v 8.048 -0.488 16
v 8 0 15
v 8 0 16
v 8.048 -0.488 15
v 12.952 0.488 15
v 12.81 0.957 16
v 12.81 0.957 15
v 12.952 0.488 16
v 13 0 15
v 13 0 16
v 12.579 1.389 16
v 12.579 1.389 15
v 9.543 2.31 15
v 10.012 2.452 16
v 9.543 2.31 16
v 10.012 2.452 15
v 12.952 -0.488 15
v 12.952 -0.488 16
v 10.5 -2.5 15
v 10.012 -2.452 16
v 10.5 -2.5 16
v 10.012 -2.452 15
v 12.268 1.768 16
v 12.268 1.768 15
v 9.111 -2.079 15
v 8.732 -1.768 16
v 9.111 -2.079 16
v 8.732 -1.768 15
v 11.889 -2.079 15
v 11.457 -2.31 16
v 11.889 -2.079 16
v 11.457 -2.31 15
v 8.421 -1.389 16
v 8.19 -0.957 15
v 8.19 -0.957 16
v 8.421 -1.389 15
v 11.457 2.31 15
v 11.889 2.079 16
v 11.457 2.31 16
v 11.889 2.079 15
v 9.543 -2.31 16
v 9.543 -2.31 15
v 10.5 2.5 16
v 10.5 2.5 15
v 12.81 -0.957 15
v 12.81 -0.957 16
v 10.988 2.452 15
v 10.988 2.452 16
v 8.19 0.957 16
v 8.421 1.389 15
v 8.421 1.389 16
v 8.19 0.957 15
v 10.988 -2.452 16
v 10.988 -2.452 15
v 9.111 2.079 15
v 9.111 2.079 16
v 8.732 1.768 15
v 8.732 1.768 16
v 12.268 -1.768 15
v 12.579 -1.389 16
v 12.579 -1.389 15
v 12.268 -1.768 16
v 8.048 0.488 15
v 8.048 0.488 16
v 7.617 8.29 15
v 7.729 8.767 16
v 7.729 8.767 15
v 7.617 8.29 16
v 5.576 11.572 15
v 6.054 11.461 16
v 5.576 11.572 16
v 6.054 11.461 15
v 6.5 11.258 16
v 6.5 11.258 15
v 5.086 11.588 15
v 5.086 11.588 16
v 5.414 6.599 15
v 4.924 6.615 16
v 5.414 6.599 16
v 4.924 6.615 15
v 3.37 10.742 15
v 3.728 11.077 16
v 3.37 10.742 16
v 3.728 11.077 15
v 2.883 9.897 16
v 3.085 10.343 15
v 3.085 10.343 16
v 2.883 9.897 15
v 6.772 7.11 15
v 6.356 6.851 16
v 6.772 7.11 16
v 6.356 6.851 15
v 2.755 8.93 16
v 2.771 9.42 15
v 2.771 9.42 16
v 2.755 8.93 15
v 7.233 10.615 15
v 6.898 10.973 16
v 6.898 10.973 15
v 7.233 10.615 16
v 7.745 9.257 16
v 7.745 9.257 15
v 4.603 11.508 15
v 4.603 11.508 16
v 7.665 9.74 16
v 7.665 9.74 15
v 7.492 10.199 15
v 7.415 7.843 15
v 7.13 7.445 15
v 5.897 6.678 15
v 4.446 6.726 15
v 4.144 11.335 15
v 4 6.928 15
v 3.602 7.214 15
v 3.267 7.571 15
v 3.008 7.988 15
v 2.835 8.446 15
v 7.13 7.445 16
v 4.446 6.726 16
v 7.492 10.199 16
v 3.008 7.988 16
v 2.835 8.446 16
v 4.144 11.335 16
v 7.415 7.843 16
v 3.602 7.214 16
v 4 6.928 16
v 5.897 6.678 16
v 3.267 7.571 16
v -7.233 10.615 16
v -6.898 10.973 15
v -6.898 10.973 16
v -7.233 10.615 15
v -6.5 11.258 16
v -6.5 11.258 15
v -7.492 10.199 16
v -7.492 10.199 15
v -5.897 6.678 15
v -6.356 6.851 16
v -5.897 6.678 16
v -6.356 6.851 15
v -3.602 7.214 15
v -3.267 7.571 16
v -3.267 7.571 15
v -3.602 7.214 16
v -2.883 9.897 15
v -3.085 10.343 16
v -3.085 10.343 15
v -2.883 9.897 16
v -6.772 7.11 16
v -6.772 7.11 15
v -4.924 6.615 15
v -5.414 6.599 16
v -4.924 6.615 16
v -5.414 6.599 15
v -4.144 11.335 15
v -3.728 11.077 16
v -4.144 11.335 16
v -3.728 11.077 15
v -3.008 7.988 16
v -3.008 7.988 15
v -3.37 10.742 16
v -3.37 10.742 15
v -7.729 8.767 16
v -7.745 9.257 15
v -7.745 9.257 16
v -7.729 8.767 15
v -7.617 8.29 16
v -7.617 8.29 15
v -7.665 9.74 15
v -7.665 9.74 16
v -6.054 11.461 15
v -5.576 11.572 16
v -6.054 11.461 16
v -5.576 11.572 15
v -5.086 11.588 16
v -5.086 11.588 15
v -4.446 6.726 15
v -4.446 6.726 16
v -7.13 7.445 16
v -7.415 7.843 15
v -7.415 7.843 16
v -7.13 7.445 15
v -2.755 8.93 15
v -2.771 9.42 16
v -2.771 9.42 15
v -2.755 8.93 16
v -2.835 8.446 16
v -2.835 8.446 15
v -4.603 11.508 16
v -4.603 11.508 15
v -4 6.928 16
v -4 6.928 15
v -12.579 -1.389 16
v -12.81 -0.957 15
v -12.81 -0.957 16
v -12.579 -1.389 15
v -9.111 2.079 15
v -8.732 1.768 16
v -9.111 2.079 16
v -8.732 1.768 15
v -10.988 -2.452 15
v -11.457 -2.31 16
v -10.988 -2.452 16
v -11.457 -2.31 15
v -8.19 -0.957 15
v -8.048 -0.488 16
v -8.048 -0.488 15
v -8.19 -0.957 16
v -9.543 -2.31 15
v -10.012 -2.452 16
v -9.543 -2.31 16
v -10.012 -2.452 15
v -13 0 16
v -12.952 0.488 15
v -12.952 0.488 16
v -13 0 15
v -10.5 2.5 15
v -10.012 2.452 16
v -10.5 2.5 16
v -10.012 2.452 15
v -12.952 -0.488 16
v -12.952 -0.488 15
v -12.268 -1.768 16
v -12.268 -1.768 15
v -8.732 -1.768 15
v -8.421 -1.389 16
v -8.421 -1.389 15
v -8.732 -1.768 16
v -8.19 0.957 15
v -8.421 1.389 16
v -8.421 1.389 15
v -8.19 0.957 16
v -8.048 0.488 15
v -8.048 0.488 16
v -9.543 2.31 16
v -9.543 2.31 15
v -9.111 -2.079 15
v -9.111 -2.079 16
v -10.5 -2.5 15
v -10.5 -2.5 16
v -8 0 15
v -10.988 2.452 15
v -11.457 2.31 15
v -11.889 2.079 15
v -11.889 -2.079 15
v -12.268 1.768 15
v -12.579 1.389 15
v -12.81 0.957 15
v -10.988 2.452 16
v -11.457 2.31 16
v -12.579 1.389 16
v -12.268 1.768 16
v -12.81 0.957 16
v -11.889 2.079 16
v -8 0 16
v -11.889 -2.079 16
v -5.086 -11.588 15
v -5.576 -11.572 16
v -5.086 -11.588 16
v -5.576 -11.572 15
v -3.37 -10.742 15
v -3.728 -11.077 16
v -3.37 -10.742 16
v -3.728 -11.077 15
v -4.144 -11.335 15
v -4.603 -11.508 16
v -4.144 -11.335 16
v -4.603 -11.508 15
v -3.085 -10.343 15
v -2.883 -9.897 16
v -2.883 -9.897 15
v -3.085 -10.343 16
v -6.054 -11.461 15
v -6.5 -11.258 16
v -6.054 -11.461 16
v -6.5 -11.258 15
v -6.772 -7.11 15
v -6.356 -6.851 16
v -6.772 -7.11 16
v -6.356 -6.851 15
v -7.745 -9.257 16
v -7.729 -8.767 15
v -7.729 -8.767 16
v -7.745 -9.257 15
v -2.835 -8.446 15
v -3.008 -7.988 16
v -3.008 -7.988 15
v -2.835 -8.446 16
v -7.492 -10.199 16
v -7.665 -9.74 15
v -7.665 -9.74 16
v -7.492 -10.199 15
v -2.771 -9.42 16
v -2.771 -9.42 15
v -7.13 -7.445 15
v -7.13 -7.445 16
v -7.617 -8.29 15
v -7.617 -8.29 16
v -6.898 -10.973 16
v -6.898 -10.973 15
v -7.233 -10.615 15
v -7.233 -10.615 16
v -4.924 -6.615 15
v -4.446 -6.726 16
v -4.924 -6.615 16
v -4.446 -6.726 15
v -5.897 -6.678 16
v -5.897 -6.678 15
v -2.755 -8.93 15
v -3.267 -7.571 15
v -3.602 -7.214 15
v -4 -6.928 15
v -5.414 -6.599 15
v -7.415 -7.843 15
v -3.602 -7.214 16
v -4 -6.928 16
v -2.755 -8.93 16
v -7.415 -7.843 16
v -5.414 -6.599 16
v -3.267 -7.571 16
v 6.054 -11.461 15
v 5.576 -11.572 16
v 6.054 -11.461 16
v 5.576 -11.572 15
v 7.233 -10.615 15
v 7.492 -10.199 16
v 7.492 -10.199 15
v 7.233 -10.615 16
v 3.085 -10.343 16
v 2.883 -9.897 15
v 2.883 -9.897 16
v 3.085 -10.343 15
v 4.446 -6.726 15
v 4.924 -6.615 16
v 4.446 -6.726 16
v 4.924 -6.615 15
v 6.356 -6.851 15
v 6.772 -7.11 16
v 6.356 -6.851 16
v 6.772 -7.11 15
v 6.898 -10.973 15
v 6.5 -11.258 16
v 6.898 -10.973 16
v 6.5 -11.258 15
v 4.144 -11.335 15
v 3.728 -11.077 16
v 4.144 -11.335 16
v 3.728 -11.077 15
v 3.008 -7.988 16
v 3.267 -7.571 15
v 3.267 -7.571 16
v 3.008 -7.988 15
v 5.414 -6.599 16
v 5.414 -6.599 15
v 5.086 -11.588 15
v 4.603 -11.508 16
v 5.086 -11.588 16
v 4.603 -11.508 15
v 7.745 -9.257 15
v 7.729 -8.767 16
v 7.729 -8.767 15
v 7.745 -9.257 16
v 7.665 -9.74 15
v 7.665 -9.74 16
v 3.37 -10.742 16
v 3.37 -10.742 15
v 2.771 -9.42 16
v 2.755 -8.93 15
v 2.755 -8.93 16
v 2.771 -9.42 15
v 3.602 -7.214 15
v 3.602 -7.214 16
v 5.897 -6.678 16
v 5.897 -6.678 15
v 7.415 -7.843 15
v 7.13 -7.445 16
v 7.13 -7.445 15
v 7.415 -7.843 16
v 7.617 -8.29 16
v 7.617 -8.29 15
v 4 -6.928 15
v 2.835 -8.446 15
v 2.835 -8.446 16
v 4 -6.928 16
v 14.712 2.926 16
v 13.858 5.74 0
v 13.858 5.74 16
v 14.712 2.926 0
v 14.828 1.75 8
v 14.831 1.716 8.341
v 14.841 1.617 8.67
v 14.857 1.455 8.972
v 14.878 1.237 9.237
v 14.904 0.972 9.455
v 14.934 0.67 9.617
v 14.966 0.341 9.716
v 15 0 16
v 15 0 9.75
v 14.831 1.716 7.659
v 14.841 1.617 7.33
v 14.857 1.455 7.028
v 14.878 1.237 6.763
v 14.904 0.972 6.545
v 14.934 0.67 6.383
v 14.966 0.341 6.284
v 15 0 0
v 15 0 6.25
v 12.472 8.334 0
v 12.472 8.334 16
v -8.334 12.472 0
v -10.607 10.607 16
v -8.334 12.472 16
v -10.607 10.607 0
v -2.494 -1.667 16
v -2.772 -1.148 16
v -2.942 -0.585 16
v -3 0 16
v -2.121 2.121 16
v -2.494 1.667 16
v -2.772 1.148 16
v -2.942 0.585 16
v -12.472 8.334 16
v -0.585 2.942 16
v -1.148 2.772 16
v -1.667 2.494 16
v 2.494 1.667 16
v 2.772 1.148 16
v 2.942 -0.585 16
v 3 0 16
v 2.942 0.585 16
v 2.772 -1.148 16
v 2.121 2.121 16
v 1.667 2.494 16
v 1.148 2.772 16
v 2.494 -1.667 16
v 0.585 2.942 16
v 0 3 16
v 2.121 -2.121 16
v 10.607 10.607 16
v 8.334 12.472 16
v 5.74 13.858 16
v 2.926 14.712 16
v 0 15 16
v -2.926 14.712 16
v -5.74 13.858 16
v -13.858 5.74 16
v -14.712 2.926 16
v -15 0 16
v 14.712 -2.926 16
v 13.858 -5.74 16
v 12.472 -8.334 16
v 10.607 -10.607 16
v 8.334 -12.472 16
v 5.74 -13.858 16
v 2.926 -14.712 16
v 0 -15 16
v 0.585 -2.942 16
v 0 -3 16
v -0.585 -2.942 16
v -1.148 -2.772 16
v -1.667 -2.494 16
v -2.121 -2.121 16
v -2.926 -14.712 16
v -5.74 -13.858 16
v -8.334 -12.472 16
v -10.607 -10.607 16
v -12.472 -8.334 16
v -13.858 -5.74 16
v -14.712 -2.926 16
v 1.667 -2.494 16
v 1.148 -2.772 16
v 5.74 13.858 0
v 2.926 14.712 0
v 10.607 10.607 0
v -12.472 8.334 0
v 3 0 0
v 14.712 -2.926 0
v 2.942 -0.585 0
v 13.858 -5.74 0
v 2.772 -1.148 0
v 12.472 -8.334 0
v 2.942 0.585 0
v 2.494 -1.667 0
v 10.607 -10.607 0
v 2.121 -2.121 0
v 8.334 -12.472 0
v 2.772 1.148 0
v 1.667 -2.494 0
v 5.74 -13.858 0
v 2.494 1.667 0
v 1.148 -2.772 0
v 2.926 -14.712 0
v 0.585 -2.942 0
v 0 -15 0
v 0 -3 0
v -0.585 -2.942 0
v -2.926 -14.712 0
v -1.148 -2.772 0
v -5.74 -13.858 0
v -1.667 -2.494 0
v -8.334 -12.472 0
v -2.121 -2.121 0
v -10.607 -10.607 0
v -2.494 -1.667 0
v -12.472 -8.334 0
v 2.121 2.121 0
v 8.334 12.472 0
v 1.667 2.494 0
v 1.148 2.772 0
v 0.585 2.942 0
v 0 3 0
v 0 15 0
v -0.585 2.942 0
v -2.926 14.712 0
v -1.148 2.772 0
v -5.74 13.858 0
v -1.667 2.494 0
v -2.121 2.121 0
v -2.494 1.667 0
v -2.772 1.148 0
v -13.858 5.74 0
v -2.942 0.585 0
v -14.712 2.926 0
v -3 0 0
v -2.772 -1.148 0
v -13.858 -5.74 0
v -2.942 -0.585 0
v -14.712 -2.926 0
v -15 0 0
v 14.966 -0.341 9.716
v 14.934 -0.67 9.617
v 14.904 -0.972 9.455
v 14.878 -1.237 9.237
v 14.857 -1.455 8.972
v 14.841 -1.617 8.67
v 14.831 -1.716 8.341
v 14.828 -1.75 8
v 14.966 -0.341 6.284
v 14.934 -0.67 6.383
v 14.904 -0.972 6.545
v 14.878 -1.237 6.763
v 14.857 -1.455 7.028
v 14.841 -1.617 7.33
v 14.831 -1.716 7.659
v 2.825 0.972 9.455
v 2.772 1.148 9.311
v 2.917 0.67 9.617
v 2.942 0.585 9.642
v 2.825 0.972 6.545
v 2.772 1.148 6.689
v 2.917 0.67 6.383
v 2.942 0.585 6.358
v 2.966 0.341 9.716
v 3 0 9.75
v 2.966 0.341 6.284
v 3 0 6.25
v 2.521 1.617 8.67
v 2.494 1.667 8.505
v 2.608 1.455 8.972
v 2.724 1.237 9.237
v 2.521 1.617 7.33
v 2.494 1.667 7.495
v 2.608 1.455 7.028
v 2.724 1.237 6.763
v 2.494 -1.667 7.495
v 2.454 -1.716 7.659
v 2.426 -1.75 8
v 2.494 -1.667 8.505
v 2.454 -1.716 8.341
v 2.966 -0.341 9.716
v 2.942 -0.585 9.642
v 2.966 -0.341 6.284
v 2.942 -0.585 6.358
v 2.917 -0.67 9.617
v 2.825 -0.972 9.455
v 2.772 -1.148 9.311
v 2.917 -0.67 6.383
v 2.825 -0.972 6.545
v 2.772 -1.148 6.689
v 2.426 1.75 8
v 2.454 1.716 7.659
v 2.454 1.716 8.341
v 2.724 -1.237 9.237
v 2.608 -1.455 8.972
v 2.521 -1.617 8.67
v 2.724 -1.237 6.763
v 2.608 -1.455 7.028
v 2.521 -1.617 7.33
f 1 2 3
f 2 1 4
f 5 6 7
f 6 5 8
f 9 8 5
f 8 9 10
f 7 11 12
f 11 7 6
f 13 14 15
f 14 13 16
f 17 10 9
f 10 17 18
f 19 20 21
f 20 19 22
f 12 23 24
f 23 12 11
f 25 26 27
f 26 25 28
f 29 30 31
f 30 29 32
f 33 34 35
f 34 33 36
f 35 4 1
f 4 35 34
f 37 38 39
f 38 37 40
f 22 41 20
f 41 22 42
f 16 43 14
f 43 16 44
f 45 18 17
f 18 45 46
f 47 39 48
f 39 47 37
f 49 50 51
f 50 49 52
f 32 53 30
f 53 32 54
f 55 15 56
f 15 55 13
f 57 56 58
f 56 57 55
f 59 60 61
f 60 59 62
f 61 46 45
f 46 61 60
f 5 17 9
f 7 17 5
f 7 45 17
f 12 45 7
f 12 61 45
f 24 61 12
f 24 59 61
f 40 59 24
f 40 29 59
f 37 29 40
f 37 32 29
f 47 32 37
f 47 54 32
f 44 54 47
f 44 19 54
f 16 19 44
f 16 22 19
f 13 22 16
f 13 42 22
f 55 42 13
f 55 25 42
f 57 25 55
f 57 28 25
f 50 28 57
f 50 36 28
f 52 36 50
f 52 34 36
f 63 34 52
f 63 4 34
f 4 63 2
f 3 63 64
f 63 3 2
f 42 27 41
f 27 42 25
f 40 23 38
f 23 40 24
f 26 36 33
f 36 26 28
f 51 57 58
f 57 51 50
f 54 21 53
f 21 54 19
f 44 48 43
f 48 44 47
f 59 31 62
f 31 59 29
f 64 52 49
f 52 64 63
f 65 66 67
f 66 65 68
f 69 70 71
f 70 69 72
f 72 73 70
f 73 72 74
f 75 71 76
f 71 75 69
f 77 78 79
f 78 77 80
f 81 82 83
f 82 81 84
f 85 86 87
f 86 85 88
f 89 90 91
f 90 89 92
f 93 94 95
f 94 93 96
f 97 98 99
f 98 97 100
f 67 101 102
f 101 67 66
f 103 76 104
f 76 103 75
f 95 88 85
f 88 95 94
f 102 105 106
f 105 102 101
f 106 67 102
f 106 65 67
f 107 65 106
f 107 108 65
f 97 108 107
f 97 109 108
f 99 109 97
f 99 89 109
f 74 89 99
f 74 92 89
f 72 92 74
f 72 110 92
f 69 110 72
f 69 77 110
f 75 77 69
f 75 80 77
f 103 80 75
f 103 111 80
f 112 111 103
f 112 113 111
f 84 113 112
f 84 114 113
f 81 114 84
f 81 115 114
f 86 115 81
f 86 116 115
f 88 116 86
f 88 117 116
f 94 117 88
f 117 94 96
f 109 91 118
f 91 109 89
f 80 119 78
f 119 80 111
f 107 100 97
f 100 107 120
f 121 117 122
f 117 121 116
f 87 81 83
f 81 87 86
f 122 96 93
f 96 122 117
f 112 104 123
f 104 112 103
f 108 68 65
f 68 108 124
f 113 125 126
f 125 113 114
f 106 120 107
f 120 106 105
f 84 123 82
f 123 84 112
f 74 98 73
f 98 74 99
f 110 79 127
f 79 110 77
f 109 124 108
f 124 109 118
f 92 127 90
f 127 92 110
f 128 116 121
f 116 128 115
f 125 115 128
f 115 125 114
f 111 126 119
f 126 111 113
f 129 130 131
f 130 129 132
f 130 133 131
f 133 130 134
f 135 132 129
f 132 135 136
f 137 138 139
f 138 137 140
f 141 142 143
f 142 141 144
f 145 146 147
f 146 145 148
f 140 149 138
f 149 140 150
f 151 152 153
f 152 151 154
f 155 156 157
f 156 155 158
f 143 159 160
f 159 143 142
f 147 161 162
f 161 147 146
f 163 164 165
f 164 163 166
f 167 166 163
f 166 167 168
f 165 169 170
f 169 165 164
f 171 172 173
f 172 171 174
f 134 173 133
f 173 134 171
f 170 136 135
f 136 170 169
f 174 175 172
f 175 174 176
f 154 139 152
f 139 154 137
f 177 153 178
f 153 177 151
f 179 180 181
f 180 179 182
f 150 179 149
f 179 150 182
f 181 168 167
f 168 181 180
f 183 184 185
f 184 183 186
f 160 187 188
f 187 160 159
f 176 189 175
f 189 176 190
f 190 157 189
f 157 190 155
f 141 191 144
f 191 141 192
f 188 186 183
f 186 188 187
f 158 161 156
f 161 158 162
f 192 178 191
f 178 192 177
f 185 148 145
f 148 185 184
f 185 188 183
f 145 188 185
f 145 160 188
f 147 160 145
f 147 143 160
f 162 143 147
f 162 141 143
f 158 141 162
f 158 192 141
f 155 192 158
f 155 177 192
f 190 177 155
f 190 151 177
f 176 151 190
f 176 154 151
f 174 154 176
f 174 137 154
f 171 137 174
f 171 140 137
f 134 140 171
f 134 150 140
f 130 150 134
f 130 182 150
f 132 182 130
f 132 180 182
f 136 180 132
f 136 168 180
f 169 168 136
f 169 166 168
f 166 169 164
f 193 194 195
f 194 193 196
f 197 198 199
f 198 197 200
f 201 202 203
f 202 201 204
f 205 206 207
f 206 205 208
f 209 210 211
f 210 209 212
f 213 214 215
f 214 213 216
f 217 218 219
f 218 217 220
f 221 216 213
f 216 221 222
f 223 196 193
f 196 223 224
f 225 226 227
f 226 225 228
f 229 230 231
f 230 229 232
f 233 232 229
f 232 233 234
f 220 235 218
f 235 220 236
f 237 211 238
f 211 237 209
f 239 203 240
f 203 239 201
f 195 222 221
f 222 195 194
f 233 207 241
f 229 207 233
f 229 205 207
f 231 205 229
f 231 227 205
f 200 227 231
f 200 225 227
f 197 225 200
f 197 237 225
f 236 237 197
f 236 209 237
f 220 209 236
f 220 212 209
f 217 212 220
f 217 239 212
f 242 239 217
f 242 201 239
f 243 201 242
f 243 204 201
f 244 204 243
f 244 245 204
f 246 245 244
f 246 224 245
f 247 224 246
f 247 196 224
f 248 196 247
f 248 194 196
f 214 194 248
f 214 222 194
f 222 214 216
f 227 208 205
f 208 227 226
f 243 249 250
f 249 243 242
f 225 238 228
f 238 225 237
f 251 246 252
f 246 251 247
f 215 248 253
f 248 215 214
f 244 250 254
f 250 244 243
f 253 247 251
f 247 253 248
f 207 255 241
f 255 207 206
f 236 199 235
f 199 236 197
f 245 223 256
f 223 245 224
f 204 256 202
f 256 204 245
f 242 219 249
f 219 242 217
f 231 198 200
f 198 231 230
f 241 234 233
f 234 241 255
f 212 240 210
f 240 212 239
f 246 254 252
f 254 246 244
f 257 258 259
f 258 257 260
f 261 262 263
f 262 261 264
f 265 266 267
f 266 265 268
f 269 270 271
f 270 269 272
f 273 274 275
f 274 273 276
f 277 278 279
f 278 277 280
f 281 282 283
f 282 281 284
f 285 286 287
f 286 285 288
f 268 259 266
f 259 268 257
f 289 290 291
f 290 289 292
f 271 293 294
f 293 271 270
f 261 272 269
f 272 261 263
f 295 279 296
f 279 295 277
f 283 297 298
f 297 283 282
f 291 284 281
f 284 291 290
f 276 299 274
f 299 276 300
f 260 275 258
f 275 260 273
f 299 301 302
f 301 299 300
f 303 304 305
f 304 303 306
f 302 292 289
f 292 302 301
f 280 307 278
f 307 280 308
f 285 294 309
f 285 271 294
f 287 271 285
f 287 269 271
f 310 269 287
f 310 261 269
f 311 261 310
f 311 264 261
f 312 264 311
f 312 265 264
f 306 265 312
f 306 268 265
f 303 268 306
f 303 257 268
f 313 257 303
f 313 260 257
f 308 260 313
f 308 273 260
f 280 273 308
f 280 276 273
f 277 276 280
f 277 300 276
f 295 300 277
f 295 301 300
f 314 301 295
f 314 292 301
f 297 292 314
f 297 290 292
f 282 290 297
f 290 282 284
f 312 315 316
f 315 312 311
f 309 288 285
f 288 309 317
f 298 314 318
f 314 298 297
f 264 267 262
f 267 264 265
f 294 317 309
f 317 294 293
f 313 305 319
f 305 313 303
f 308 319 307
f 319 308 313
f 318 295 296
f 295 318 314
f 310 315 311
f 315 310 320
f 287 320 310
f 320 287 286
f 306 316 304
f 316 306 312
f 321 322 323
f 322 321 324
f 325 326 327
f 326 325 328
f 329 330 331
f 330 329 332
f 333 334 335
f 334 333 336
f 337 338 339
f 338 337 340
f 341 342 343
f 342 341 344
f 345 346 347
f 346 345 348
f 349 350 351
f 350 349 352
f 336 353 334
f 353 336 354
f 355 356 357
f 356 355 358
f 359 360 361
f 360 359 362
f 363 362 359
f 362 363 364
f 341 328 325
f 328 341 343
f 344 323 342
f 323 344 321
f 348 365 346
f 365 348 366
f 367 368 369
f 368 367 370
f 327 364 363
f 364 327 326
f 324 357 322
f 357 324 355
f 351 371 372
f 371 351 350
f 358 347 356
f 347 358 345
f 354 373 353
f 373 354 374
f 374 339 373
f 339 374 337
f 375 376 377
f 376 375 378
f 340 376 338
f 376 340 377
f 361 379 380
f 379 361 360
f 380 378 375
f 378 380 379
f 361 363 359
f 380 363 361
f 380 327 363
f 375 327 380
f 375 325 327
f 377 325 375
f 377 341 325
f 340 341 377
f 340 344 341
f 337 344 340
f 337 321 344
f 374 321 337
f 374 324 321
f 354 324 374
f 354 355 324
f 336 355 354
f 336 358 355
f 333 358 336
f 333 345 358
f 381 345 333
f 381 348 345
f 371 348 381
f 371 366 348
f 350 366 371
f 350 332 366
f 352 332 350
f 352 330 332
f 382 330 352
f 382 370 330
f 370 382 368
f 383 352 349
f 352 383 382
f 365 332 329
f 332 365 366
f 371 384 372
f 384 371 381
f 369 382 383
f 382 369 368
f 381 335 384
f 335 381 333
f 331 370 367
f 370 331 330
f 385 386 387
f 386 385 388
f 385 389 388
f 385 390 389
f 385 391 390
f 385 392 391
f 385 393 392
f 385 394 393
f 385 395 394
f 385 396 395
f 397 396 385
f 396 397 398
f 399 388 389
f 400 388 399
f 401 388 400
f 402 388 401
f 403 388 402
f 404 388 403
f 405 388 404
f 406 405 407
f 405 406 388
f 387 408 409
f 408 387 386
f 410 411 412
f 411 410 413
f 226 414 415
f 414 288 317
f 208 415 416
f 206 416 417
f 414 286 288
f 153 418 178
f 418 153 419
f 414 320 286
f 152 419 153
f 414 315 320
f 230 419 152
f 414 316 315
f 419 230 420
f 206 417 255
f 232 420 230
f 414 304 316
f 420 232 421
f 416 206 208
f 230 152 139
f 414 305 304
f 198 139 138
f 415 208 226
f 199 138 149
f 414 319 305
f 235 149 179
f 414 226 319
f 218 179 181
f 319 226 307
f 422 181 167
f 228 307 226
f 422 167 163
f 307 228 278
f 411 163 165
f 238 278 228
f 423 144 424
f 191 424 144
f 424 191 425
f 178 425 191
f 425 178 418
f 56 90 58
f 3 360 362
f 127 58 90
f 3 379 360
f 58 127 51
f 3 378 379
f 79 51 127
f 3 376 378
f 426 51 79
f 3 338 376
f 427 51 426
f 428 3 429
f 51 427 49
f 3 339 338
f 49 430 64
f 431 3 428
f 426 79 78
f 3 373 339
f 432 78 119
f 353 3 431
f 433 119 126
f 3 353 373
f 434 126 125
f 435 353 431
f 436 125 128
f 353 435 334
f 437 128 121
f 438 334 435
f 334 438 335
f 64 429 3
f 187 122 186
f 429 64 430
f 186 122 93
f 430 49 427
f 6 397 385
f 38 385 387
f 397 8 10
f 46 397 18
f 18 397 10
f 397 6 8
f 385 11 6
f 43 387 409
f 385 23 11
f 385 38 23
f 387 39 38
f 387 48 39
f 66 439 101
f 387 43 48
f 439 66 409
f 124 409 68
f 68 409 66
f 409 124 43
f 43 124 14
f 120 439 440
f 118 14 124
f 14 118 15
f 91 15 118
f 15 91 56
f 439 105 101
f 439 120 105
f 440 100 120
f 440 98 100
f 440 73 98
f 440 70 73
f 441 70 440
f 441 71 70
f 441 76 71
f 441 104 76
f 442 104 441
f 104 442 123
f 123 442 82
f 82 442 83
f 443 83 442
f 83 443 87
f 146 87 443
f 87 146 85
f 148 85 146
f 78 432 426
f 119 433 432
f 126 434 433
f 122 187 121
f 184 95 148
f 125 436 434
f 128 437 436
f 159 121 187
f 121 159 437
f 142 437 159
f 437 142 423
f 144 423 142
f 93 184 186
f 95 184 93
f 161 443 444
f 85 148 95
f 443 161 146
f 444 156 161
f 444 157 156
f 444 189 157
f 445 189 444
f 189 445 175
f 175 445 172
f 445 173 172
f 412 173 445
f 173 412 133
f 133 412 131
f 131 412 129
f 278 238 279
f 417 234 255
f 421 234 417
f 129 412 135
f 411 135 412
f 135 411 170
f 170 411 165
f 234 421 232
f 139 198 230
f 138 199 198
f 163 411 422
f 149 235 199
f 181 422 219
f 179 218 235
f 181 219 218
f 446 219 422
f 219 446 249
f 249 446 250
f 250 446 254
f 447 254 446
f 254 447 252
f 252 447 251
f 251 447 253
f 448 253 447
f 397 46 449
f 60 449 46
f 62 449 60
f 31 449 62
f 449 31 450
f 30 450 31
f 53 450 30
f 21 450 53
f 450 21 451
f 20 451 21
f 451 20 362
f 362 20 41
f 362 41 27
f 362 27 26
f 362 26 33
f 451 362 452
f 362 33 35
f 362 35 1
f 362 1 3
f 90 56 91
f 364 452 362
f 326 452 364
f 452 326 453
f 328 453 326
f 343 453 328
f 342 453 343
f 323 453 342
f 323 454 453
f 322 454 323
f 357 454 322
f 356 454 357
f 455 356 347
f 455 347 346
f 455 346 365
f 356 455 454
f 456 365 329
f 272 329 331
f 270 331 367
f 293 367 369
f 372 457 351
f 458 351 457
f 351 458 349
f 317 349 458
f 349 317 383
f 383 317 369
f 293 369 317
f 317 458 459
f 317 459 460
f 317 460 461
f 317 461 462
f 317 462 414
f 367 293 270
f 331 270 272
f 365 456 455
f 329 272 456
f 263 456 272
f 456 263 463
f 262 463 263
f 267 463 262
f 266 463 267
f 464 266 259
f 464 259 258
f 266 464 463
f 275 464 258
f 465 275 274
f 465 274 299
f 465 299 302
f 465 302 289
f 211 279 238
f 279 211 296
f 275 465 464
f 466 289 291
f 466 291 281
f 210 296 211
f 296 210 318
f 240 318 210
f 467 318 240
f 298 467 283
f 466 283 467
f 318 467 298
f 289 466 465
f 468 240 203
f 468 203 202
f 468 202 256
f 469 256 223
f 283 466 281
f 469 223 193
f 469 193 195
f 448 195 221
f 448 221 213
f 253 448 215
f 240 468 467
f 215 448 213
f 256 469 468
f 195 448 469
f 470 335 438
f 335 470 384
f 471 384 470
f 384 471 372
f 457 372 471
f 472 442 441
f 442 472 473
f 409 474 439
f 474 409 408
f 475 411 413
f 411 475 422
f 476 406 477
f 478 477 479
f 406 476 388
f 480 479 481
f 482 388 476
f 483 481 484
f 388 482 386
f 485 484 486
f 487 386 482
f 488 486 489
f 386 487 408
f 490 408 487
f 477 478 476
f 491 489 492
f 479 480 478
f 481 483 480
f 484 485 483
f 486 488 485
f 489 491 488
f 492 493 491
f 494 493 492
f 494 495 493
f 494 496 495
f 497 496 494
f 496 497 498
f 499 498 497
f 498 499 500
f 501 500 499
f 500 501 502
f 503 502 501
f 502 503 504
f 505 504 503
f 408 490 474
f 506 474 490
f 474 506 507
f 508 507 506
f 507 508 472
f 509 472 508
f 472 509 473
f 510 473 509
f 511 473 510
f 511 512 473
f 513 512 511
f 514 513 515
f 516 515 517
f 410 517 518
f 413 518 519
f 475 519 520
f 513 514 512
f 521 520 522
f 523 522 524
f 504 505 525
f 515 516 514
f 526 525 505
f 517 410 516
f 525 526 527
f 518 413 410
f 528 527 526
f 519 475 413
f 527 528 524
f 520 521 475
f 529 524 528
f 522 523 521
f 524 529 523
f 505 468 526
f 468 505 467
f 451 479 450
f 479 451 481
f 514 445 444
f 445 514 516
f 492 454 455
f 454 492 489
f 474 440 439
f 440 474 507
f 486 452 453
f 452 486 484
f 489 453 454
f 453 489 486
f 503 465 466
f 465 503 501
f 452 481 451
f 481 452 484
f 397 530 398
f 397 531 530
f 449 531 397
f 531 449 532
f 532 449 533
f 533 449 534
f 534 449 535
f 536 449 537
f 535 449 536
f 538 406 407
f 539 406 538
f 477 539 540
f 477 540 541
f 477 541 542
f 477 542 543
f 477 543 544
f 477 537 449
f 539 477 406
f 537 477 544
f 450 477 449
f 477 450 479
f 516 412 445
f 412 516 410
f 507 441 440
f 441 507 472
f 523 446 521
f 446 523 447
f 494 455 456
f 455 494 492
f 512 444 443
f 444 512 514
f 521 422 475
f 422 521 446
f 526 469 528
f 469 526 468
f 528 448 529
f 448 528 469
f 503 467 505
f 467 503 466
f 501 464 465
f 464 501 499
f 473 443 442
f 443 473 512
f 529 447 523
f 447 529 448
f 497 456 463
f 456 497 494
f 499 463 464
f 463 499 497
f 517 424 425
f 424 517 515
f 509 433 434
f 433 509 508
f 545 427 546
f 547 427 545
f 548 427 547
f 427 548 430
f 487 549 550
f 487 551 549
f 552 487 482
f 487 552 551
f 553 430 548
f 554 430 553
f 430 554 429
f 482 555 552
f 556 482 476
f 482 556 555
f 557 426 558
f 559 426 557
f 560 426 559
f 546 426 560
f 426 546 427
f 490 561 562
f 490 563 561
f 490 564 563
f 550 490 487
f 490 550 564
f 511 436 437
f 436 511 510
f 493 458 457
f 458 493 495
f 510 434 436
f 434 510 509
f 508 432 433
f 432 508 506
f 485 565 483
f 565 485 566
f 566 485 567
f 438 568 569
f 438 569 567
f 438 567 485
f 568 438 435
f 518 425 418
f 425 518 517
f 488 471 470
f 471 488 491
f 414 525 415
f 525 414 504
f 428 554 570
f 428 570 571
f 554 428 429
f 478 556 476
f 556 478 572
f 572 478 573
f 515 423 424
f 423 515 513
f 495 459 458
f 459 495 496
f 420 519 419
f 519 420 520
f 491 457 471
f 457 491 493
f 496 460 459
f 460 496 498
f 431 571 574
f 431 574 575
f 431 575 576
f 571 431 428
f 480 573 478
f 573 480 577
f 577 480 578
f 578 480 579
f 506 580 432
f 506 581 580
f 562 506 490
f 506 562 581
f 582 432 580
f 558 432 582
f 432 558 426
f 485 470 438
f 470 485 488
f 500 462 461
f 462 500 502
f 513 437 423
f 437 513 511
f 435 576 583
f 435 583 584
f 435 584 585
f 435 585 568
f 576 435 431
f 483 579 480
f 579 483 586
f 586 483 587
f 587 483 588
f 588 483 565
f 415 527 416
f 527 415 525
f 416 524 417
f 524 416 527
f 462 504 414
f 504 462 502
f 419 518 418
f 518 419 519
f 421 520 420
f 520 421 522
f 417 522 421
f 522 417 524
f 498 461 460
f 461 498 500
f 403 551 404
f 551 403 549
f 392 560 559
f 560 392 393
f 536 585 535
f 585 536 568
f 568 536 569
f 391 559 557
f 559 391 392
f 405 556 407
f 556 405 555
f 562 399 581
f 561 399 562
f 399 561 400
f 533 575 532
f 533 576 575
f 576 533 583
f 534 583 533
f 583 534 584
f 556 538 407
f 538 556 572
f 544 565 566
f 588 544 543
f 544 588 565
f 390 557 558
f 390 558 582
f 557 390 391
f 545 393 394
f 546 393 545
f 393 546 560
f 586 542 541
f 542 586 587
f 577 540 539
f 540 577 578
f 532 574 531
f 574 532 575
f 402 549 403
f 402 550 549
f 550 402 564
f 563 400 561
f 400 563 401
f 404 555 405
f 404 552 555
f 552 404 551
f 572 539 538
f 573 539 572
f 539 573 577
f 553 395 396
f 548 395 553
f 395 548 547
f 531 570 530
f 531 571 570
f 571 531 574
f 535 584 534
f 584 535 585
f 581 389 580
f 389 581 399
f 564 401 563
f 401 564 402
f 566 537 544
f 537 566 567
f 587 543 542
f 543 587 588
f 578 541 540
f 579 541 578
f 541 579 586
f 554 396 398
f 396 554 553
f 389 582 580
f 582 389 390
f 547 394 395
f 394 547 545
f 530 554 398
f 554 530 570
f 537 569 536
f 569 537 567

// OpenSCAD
$fn = 32;

// ----------------------------------------------------------------------
// Control knob: dimpled knob
// ----------------------------------------------------------------------

// --- parameters (mm) ---
dimp_d = 5;               // finger dimple diameter
n_dimp = 6;               // number of dimples
dimp_r = 10.5;            // dimple ring radius
knob_d = 30;              // knob body diameter
knob_h = 16;              // knob body height
bore_d = 6;               // shaft bore diameter
set_d = 3.5;              // set screw bore diameter

dimp_step = 360 / n_dimp;  // dimple angular step

difference() {
  cylinder(h = knob_h, d = knob_d);
  translate([0, 0, -1]) cylinder(h = knob_h + 2, d = bore_d);
  translate([-1, 0, knob_h / 2]) rotate([0, 90, 0])
    cylinder(h = knob_d / 2 + bore_d / 2 + 2, d = set_d);  for (i = [0 : n_dimp - 1])
    rotate([0, 0, i * dimp_step])
      translate([dimp_r, 0, knob_h - 1])
        cylinder(h = 2, d = dimp_d);
}
